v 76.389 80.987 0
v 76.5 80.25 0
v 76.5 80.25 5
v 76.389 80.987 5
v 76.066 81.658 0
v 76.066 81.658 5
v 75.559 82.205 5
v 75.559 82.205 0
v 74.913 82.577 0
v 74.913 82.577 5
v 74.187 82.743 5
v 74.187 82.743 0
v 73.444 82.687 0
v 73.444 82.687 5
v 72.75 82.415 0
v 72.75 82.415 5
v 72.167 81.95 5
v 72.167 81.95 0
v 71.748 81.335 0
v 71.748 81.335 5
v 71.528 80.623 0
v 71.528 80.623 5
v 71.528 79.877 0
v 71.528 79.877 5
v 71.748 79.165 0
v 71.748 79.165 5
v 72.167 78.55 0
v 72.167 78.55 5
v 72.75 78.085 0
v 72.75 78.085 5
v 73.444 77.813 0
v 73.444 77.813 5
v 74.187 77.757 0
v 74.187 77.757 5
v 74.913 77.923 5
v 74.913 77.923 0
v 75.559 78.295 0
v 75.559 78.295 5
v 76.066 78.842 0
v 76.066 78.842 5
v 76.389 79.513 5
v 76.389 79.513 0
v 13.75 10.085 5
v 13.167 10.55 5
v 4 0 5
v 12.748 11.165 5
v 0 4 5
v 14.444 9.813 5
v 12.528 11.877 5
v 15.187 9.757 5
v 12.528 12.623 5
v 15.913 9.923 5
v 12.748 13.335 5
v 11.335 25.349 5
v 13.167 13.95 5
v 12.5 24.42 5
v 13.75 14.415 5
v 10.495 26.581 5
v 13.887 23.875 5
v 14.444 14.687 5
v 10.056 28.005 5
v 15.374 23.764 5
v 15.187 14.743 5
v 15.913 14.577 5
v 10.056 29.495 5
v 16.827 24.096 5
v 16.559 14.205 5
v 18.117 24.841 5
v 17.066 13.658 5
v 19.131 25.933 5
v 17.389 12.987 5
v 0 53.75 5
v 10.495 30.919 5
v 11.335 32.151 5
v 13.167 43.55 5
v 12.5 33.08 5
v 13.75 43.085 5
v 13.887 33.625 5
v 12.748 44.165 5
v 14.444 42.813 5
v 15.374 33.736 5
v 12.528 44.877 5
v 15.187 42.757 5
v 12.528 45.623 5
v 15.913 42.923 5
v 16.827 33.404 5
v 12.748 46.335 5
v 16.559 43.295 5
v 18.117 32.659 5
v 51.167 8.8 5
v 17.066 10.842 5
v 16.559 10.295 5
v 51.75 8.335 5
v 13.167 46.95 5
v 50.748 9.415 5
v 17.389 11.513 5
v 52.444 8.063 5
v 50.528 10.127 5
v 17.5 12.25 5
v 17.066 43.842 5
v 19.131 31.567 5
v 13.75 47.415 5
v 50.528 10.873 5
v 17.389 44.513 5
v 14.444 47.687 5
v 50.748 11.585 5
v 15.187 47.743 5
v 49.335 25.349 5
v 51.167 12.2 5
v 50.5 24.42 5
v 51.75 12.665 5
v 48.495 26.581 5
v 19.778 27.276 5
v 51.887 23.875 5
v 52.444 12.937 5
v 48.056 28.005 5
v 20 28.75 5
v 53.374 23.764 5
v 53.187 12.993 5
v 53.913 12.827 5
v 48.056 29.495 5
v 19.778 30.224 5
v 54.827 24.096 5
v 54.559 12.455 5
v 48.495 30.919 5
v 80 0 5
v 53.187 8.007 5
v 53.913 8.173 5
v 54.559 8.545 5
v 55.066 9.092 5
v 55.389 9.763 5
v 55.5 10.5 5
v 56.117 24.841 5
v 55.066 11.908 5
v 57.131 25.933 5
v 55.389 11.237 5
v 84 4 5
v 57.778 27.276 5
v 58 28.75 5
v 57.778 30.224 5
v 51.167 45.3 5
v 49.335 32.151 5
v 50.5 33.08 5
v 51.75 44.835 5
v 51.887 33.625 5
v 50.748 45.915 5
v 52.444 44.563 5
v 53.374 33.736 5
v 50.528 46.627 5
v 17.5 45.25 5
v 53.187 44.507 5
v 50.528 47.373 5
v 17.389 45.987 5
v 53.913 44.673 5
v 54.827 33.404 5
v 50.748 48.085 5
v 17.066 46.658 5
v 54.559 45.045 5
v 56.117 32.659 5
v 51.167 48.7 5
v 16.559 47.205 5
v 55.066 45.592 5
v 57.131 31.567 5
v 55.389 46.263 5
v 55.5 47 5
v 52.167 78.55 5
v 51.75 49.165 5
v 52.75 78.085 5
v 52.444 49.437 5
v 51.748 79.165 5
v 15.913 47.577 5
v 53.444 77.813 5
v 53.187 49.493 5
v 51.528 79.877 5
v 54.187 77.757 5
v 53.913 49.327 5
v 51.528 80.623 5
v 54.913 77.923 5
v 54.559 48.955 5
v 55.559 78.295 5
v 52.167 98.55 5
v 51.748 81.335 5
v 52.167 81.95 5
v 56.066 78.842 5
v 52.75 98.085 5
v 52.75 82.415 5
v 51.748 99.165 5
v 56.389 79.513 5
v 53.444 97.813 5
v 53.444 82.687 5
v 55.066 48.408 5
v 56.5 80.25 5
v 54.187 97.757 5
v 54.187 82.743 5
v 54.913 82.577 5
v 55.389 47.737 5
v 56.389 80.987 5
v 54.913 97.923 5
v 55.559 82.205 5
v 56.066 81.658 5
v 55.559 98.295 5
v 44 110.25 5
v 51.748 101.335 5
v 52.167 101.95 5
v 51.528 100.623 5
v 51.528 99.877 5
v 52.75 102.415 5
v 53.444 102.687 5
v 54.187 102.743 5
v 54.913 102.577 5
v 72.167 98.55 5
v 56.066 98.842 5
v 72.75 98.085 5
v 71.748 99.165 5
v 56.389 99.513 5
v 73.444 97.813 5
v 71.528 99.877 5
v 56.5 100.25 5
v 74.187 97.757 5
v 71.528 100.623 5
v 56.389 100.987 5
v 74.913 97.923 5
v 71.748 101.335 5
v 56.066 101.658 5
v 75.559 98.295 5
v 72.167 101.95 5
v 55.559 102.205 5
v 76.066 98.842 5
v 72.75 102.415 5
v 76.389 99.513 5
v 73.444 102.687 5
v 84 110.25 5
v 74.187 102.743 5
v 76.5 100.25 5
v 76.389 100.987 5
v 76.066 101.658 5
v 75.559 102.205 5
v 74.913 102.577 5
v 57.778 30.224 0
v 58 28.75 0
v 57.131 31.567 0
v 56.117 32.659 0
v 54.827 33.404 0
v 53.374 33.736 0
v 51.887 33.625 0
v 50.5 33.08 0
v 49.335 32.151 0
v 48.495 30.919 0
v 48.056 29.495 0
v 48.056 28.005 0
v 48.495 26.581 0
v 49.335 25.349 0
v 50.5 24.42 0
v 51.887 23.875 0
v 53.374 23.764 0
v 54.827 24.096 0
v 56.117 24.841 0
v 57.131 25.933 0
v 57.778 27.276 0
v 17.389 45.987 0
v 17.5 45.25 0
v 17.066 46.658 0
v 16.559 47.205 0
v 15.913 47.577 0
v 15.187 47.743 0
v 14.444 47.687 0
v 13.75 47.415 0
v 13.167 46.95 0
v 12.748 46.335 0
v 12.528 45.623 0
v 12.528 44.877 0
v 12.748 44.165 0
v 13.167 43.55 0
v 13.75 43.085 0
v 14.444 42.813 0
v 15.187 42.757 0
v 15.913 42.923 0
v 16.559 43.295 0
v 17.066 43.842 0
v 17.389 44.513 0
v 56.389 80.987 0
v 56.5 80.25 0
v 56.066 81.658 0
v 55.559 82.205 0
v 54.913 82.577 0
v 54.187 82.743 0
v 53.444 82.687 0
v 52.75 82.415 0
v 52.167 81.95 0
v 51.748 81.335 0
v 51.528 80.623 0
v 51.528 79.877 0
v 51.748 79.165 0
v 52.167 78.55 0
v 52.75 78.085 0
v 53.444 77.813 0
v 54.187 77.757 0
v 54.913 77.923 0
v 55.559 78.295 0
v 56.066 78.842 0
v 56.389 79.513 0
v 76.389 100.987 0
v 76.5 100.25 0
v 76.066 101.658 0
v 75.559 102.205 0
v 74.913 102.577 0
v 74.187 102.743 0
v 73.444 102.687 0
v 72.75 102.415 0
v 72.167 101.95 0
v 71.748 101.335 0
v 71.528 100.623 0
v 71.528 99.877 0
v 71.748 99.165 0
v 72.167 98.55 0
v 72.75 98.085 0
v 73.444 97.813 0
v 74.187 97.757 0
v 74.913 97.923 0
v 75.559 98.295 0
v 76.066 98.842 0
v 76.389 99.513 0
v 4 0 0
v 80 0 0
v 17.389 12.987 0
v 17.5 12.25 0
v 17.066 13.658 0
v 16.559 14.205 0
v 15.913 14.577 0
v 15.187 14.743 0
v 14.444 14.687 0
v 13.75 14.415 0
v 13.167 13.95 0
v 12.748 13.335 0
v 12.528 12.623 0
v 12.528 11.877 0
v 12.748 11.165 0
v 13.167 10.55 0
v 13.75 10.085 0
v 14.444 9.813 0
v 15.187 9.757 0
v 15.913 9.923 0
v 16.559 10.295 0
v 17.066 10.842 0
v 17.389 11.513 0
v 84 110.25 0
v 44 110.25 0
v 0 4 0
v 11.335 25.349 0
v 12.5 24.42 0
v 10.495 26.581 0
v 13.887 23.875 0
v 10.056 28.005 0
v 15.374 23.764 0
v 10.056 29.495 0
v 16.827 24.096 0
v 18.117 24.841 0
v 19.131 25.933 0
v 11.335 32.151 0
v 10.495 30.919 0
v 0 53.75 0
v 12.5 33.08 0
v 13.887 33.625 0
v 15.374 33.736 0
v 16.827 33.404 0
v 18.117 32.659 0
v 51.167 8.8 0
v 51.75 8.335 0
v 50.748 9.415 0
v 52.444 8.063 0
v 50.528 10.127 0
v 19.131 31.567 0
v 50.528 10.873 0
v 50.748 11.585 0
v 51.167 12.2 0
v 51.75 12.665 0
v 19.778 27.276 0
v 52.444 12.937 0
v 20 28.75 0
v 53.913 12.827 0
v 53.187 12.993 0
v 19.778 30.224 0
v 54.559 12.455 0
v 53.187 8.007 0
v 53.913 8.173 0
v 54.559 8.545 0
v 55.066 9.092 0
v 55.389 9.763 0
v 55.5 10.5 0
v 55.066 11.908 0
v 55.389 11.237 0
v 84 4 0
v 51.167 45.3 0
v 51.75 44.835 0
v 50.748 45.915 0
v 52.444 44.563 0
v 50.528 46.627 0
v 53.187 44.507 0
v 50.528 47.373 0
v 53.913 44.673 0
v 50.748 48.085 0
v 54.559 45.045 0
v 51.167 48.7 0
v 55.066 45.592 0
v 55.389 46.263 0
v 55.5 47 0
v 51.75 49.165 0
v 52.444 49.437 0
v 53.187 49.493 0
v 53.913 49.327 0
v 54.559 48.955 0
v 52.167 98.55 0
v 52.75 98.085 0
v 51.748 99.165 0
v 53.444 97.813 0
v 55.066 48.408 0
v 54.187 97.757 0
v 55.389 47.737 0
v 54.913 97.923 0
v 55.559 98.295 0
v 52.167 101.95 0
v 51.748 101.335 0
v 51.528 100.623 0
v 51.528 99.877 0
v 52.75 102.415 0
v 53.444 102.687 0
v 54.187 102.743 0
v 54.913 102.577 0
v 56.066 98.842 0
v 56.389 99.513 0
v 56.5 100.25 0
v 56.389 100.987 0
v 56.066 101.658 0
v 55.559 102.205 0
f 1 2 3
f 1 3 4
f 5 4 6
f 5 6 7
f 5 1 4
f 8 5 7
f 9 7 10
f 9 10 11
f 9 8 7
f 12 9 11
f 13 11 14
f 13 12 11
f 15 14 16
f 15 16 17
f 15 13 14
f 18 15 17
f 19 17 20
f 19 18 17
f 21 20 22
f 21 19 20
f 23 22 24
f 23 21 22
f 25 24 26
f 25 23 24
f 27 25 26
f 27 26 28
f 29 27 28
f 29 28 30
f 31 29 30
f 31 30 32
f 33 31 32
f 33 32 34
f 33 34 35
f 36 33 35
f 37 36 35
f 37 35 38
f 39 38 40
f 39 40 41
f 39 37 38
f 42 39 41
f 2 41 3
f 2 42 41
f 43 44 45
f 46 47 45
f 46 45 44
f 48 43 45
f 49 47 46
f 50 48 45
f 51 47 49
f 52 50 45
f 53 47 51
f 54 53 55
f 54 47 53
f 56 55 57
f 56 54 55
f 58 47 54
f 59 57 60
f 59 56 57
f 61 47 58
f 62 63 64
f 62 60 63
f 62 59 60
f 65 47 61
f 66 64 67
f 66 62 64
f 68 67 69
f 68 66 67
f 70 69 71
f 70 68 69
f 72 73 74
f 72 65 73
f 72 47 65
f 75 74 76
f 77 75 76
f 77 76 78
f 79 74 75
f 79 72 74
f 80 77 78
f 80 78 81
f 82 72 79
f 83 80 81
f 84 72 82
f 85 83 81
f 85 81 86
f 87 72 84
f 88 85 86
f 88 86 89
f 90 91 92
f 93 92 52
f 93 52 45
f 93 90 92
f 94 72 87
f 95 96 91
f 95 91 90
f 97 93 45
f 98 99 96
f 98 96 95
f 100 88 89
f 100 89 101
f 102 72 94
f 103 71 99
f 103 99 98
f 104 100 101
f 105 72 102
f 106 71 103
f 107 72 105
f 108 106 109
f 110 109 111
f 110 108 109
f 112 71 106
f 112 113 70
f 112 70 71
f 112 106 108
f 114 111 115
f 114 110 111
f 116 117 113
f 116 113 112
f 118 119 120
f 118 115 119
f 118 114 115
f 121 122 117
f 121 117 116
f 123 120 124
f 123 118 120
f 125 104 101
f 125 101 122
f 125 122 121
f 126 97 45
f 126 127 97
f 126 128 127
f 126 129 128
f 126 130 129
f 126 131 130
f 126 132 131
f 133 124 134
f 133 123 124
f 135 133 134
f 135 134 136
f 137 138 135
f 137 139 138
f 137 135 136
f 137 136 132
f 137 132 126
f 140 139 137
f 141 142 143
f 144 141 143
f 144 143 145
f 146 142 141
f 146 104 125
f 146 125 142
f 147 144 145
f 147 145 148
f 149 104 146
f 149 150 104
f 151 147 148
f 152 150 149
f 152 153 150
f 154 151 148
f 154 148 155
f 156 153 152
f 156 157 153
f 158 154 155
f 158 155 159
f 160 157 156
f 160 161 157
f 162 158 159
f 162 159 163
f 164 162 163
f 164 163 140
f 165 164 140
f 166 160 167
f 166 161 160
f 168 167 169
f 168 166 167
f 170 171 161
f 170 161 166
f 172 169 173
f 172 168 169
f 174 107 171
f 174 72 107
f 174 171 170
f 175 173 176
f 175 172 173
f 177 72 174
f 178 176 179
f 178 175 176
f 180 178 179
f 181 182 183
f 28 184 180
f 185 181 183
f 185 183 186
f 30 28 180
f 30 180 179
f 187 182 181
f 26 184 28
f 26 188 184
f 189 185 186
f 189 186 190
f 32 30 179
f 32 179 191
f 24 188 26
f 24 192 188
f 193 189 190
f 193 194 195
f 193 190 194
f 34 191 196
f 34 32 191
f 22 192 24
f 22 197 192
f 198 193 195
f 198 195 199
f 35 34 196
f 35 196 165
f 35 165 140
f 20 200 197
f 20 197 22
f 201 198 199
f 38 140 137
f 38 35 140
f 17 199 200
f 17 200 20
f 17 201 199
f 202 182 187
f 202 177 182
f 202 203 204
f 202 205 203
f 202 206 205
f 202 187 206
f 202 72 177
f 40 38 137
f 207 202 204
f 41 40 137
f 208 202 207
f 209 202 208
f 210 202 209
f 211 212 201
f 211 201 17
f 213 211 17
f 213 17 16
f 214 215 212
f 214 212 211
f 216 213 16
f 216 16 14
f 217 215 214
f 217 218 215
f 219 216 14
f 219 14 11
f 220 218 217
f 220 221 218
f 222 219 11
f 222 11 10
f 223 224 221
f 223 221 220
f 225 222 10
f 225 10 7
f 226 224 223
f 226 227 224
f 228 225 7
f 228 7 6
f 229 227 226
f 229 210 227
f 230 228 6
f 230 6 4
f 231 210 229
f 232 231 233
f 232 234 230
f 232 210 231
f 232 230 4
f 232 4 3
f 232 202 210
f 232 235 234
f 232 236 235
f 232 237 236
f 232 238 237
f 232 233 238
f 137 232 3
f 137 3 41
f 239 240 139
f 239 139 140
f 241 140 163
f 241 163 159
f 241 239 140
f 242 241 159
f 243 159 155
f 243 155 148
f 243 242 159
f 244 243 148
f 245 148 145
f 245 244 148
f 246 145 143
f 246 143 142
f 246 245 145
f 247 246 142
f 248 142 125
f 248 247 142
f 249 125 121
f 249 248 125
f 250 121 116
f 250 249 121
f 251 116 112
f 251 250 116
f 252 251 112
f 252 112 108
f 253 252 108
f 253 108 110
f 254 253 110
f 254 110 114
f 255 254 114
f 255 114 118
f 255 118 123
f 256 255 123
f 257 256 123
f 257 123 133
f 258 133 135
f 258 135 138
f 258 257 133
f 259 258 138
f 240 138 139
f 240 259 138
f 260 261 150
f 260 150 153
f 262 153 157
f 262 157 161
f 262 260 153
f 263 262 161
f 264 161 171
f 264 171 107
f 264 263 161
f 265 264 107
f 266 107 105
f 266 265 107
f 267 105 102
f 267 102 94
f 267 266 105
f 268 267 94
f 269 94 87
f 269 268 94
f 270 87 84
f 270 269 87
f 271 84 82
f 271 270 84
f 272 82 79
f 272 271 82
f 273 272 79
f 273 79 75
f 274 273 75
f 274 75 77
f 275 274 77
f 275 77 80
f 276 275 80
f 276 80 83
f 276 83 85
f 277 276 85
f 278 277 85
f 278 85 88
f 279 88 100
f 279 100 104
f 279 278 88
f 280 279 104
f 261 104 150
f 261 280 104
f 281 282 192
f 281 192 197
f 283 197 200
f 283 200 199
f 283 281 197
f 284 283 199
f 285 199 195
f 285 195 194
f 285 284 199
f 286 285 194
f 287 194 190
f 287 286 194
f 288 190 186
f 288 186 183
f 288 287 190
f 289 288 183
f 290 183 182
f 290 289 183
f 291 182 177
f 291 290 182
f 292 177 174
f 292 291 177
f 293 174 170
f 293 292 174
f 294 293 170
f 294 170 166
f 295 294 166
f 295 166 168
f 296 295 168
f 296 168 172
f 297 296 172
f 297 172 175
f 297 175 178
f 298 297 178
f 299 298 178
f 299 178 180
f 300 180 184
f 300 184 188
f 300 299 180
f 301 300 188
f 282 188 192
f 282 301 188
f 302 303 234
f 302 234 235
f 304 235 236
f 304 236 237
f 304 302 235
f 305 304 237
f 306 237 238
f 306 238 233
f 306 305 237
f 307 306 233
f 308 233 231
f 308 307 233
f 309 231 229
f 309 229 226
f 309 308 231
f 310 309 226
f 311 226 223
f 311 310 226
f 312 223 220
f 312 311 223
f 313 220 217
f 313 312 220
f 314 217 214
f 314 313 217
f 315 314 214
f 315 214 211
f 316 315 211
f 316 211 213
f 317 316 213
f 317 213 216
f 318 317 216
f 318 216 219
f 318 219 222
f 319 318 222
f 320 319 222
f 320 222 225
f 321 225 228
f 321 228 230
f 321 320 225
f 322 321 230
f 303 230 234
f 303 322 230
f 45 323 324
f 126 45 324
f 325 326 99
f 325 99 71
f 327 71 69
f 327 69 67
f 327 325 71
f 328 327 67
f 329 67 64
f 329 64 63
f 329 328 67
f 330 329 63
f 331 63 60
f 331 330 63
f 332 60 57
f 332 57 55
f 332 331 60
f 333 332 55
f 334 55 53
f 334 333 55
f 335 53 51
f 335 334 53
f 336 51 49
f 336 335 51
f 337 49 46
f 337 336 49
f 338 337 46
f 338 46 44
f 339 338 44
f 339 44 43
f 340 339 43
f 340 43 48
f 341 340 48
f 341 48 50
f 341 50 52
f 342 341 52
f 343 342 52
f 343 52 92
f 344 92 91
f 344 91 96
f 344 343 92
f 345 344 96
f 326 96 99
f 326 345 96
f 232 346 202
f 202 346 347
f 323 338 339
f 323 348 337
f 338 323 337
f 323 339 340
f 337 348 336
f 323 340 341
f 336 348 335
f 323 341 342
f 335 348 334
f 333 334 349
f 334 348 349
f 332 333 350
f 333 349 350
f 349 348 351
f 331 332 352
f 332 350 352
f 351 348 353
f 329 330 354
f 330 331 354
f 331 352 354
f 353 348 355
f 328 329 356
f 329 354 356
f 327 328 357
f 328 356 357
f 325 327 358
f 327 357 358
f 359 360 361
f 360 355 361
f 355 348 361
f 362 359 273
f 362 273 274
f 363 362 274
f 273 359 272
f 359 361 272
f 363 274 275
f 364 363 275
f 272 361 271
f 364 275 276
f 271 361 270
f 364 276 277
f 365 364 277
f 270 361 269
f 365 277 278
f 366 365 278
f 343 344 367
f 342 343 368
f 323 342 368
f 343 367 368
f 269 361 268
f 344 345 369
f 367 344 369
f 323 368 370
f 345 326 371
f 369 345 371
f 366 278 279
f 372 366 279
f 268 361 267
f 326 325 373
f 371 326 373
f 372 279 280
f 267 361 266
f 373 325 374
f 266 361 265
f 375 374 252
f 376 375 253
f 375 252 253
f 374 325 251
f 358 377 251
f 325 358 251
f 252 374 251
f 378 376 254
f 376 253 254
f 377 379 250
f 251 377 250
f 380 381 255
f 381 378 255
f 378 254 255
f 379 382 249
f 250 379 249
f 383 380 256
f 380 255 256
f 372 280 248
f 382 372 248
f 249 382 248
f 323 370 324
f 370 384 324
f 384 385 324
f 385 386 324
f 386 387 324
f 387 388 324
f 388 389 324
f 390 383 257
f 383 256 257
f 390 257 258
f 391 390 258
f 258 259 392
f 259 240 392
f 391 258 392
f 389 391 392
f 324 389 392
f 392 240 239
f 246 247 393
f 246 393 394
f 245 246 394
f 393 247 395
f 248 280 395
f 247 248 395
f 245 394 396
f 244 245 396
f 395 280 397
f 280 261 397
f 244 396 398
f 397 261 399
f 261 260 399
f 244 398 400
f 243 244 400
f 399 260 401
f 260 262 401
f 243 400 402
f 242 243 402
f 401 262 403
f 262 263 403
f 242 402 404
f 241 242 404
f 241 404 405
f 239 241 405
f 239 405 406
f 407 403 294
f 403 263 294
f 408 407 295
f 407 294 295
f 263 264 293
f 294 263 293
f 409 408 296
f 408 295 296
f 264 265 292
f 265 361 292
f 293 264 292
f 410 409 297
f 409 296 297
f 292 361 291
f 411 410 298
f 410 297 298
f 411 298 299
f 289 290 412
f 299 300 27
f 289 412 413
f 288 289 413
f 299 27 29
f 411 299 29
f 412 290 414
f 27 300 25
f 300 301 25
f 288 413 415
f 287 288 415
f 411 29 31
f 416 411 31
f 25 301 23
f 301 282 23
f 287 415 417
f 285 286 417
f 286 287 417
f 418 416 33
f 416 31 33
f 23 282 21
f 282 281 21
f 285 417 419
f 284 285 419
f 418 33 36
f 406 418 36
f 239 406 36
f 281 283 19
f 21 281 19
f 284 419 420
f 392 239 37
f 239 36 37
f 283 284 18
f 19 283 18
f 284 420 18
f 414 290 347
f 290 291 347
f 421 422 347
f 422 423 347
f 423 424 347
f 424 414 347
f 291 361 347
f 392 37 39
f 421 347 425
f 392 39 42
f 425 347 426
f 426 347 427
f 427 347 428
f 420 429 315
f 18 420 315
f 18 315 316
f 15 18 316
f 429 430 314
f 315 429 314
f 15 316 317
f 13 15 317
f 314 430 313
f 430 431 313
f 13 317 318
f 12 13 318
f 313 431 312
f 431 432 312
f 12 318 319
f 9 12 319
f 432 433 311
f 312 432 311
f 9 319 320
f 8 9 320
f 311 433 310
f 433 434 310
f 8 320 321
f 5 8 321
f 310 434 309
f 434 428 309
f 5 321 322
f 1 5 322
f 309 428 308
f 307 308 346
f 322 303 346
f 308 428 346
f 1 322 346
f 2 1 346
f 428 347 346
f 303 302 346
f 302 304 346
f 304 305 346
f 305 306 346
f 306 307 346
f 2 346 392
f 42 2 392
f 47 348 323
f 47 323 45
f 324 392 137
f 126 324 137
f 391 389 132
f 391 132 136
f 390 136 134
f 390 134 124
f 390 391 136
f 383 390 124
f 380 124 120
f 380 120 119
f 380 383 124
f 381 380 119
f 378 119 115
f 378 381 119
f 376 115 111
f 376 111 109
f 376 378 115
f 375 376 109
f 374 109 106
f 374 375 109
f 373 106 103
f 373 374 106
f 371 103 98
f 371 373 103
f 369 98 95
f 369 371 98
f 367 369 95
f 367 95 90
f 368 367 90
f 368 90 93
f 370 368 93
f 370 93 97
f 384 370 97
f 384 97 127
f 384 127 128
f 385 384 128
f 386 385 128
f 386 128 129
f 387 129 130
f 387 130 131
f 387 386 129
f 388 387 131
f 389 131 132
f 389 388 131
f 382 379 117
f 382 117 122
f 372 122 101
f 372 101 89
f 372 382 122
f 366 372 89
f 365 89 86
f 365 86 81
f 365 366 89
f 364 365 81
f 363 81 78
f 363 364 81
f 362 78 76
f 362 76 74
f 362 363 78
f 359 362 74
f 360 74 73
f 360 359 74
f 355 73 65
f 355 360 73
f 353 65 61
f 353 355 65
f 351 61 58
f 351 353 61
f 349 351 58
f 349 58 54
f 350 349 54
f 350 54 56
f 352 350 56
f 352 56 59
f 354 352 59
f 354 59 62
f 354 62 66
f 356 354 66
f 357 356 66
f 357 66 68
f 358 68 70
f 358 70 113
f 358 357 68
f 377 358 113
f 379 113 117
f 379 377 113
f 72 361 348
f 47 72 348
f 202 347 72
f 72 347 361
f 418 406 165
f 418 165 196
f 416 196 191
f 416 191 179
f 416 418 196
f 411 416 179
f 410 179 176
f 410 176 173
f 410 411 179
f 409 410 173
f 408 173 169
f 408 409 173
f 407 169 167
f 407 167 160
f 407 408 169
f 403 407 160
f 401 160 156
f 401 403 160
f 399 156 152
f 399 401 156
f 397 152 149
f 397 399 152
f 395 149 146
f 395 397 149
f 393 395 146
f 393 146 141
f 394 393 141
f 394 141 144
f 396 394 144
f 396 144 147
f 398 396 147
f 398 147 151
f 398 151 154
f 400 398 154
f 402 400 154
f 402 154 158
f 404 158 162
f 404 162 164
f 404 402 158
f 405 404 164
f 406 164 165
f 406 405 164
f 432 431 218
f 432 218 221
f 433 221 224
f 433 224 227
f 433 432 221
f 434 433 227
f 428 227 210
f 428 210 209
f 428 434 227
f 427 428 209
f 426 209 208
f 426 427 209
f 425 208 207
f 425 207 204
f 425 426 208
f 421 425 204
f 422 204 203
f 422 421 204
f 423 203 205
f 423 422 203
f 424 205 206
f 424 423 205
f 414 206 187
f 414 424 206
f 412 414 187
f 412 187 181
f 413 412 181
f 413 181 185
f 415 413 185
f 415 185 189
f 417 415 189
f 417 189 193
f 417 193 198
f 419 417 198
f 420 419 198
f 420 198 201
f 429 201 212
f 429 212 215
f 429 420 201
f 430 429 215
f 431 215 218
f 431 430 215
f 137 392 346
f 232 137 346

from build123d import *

# Parameters (mm, degrees)
SKETCH_R     = 2.5
SKETCH_R_2   = 5
PAD_DEPTH    = 5
CHAMFER_SIZE = 4


with BuildPart() as part:
    # Sketch → Pad (new body)
    with BuildSketch(Plane.XY):
        Polygon((84, 110.25), (44, 110.25), (0, 53.75), (0, 0), (84, 0), align=None)
        with Locations((15, 45.25)):
            Circle(SKETCH_R, mode=Mode.SUBTRACT)
        with Locations((15, 12.25)):
            Circle(SKETCH_R, mode=Mode.SUBTRACT)
        with Locations((15, 28.75)):
            Circle(SKETCH_R_2, mode=Mode.SUBTRACT)
        with Locations((53, 47)):
            Circle(SKETCH_R, mode=Mode.SUBTRACT)
        with Locations((53, 28.75)):
            Circle(SKETCH_R_2, mode=Mode.SUBTRACT)
        with Locations((53, 10.5)):
            Circle(SKETCH_R, mode=Mode.SUBTRACT)
        with Locations((54, 80.25)):
            Circle(SKETCH_R, mode=Mode.SUBTRACT)
        with Locations((74, 80.25)):
            Circle(SKETCH_R, mode=Mode.SUBTRACT)
        with Locations((54, 100.25)):
            Circle(SKETCH_R, mode=Mode.SUBTRACT)
        with Locations((74, 100.25)):
            Circle(SKETCH_R, mode=Mode.SUBTRACT)
    extrude(amount=PAD_DEPTH)

    # Chamfer
    chamfer_edges = [part.edges().sort_by_distance(p)[0] for p in [
        (0, 0, 2.5),
        (84, 0, 2.5),
    ]]
    chamfer(chamfer_edges, length=CHAMFER_SIZE)


solid = part.part
